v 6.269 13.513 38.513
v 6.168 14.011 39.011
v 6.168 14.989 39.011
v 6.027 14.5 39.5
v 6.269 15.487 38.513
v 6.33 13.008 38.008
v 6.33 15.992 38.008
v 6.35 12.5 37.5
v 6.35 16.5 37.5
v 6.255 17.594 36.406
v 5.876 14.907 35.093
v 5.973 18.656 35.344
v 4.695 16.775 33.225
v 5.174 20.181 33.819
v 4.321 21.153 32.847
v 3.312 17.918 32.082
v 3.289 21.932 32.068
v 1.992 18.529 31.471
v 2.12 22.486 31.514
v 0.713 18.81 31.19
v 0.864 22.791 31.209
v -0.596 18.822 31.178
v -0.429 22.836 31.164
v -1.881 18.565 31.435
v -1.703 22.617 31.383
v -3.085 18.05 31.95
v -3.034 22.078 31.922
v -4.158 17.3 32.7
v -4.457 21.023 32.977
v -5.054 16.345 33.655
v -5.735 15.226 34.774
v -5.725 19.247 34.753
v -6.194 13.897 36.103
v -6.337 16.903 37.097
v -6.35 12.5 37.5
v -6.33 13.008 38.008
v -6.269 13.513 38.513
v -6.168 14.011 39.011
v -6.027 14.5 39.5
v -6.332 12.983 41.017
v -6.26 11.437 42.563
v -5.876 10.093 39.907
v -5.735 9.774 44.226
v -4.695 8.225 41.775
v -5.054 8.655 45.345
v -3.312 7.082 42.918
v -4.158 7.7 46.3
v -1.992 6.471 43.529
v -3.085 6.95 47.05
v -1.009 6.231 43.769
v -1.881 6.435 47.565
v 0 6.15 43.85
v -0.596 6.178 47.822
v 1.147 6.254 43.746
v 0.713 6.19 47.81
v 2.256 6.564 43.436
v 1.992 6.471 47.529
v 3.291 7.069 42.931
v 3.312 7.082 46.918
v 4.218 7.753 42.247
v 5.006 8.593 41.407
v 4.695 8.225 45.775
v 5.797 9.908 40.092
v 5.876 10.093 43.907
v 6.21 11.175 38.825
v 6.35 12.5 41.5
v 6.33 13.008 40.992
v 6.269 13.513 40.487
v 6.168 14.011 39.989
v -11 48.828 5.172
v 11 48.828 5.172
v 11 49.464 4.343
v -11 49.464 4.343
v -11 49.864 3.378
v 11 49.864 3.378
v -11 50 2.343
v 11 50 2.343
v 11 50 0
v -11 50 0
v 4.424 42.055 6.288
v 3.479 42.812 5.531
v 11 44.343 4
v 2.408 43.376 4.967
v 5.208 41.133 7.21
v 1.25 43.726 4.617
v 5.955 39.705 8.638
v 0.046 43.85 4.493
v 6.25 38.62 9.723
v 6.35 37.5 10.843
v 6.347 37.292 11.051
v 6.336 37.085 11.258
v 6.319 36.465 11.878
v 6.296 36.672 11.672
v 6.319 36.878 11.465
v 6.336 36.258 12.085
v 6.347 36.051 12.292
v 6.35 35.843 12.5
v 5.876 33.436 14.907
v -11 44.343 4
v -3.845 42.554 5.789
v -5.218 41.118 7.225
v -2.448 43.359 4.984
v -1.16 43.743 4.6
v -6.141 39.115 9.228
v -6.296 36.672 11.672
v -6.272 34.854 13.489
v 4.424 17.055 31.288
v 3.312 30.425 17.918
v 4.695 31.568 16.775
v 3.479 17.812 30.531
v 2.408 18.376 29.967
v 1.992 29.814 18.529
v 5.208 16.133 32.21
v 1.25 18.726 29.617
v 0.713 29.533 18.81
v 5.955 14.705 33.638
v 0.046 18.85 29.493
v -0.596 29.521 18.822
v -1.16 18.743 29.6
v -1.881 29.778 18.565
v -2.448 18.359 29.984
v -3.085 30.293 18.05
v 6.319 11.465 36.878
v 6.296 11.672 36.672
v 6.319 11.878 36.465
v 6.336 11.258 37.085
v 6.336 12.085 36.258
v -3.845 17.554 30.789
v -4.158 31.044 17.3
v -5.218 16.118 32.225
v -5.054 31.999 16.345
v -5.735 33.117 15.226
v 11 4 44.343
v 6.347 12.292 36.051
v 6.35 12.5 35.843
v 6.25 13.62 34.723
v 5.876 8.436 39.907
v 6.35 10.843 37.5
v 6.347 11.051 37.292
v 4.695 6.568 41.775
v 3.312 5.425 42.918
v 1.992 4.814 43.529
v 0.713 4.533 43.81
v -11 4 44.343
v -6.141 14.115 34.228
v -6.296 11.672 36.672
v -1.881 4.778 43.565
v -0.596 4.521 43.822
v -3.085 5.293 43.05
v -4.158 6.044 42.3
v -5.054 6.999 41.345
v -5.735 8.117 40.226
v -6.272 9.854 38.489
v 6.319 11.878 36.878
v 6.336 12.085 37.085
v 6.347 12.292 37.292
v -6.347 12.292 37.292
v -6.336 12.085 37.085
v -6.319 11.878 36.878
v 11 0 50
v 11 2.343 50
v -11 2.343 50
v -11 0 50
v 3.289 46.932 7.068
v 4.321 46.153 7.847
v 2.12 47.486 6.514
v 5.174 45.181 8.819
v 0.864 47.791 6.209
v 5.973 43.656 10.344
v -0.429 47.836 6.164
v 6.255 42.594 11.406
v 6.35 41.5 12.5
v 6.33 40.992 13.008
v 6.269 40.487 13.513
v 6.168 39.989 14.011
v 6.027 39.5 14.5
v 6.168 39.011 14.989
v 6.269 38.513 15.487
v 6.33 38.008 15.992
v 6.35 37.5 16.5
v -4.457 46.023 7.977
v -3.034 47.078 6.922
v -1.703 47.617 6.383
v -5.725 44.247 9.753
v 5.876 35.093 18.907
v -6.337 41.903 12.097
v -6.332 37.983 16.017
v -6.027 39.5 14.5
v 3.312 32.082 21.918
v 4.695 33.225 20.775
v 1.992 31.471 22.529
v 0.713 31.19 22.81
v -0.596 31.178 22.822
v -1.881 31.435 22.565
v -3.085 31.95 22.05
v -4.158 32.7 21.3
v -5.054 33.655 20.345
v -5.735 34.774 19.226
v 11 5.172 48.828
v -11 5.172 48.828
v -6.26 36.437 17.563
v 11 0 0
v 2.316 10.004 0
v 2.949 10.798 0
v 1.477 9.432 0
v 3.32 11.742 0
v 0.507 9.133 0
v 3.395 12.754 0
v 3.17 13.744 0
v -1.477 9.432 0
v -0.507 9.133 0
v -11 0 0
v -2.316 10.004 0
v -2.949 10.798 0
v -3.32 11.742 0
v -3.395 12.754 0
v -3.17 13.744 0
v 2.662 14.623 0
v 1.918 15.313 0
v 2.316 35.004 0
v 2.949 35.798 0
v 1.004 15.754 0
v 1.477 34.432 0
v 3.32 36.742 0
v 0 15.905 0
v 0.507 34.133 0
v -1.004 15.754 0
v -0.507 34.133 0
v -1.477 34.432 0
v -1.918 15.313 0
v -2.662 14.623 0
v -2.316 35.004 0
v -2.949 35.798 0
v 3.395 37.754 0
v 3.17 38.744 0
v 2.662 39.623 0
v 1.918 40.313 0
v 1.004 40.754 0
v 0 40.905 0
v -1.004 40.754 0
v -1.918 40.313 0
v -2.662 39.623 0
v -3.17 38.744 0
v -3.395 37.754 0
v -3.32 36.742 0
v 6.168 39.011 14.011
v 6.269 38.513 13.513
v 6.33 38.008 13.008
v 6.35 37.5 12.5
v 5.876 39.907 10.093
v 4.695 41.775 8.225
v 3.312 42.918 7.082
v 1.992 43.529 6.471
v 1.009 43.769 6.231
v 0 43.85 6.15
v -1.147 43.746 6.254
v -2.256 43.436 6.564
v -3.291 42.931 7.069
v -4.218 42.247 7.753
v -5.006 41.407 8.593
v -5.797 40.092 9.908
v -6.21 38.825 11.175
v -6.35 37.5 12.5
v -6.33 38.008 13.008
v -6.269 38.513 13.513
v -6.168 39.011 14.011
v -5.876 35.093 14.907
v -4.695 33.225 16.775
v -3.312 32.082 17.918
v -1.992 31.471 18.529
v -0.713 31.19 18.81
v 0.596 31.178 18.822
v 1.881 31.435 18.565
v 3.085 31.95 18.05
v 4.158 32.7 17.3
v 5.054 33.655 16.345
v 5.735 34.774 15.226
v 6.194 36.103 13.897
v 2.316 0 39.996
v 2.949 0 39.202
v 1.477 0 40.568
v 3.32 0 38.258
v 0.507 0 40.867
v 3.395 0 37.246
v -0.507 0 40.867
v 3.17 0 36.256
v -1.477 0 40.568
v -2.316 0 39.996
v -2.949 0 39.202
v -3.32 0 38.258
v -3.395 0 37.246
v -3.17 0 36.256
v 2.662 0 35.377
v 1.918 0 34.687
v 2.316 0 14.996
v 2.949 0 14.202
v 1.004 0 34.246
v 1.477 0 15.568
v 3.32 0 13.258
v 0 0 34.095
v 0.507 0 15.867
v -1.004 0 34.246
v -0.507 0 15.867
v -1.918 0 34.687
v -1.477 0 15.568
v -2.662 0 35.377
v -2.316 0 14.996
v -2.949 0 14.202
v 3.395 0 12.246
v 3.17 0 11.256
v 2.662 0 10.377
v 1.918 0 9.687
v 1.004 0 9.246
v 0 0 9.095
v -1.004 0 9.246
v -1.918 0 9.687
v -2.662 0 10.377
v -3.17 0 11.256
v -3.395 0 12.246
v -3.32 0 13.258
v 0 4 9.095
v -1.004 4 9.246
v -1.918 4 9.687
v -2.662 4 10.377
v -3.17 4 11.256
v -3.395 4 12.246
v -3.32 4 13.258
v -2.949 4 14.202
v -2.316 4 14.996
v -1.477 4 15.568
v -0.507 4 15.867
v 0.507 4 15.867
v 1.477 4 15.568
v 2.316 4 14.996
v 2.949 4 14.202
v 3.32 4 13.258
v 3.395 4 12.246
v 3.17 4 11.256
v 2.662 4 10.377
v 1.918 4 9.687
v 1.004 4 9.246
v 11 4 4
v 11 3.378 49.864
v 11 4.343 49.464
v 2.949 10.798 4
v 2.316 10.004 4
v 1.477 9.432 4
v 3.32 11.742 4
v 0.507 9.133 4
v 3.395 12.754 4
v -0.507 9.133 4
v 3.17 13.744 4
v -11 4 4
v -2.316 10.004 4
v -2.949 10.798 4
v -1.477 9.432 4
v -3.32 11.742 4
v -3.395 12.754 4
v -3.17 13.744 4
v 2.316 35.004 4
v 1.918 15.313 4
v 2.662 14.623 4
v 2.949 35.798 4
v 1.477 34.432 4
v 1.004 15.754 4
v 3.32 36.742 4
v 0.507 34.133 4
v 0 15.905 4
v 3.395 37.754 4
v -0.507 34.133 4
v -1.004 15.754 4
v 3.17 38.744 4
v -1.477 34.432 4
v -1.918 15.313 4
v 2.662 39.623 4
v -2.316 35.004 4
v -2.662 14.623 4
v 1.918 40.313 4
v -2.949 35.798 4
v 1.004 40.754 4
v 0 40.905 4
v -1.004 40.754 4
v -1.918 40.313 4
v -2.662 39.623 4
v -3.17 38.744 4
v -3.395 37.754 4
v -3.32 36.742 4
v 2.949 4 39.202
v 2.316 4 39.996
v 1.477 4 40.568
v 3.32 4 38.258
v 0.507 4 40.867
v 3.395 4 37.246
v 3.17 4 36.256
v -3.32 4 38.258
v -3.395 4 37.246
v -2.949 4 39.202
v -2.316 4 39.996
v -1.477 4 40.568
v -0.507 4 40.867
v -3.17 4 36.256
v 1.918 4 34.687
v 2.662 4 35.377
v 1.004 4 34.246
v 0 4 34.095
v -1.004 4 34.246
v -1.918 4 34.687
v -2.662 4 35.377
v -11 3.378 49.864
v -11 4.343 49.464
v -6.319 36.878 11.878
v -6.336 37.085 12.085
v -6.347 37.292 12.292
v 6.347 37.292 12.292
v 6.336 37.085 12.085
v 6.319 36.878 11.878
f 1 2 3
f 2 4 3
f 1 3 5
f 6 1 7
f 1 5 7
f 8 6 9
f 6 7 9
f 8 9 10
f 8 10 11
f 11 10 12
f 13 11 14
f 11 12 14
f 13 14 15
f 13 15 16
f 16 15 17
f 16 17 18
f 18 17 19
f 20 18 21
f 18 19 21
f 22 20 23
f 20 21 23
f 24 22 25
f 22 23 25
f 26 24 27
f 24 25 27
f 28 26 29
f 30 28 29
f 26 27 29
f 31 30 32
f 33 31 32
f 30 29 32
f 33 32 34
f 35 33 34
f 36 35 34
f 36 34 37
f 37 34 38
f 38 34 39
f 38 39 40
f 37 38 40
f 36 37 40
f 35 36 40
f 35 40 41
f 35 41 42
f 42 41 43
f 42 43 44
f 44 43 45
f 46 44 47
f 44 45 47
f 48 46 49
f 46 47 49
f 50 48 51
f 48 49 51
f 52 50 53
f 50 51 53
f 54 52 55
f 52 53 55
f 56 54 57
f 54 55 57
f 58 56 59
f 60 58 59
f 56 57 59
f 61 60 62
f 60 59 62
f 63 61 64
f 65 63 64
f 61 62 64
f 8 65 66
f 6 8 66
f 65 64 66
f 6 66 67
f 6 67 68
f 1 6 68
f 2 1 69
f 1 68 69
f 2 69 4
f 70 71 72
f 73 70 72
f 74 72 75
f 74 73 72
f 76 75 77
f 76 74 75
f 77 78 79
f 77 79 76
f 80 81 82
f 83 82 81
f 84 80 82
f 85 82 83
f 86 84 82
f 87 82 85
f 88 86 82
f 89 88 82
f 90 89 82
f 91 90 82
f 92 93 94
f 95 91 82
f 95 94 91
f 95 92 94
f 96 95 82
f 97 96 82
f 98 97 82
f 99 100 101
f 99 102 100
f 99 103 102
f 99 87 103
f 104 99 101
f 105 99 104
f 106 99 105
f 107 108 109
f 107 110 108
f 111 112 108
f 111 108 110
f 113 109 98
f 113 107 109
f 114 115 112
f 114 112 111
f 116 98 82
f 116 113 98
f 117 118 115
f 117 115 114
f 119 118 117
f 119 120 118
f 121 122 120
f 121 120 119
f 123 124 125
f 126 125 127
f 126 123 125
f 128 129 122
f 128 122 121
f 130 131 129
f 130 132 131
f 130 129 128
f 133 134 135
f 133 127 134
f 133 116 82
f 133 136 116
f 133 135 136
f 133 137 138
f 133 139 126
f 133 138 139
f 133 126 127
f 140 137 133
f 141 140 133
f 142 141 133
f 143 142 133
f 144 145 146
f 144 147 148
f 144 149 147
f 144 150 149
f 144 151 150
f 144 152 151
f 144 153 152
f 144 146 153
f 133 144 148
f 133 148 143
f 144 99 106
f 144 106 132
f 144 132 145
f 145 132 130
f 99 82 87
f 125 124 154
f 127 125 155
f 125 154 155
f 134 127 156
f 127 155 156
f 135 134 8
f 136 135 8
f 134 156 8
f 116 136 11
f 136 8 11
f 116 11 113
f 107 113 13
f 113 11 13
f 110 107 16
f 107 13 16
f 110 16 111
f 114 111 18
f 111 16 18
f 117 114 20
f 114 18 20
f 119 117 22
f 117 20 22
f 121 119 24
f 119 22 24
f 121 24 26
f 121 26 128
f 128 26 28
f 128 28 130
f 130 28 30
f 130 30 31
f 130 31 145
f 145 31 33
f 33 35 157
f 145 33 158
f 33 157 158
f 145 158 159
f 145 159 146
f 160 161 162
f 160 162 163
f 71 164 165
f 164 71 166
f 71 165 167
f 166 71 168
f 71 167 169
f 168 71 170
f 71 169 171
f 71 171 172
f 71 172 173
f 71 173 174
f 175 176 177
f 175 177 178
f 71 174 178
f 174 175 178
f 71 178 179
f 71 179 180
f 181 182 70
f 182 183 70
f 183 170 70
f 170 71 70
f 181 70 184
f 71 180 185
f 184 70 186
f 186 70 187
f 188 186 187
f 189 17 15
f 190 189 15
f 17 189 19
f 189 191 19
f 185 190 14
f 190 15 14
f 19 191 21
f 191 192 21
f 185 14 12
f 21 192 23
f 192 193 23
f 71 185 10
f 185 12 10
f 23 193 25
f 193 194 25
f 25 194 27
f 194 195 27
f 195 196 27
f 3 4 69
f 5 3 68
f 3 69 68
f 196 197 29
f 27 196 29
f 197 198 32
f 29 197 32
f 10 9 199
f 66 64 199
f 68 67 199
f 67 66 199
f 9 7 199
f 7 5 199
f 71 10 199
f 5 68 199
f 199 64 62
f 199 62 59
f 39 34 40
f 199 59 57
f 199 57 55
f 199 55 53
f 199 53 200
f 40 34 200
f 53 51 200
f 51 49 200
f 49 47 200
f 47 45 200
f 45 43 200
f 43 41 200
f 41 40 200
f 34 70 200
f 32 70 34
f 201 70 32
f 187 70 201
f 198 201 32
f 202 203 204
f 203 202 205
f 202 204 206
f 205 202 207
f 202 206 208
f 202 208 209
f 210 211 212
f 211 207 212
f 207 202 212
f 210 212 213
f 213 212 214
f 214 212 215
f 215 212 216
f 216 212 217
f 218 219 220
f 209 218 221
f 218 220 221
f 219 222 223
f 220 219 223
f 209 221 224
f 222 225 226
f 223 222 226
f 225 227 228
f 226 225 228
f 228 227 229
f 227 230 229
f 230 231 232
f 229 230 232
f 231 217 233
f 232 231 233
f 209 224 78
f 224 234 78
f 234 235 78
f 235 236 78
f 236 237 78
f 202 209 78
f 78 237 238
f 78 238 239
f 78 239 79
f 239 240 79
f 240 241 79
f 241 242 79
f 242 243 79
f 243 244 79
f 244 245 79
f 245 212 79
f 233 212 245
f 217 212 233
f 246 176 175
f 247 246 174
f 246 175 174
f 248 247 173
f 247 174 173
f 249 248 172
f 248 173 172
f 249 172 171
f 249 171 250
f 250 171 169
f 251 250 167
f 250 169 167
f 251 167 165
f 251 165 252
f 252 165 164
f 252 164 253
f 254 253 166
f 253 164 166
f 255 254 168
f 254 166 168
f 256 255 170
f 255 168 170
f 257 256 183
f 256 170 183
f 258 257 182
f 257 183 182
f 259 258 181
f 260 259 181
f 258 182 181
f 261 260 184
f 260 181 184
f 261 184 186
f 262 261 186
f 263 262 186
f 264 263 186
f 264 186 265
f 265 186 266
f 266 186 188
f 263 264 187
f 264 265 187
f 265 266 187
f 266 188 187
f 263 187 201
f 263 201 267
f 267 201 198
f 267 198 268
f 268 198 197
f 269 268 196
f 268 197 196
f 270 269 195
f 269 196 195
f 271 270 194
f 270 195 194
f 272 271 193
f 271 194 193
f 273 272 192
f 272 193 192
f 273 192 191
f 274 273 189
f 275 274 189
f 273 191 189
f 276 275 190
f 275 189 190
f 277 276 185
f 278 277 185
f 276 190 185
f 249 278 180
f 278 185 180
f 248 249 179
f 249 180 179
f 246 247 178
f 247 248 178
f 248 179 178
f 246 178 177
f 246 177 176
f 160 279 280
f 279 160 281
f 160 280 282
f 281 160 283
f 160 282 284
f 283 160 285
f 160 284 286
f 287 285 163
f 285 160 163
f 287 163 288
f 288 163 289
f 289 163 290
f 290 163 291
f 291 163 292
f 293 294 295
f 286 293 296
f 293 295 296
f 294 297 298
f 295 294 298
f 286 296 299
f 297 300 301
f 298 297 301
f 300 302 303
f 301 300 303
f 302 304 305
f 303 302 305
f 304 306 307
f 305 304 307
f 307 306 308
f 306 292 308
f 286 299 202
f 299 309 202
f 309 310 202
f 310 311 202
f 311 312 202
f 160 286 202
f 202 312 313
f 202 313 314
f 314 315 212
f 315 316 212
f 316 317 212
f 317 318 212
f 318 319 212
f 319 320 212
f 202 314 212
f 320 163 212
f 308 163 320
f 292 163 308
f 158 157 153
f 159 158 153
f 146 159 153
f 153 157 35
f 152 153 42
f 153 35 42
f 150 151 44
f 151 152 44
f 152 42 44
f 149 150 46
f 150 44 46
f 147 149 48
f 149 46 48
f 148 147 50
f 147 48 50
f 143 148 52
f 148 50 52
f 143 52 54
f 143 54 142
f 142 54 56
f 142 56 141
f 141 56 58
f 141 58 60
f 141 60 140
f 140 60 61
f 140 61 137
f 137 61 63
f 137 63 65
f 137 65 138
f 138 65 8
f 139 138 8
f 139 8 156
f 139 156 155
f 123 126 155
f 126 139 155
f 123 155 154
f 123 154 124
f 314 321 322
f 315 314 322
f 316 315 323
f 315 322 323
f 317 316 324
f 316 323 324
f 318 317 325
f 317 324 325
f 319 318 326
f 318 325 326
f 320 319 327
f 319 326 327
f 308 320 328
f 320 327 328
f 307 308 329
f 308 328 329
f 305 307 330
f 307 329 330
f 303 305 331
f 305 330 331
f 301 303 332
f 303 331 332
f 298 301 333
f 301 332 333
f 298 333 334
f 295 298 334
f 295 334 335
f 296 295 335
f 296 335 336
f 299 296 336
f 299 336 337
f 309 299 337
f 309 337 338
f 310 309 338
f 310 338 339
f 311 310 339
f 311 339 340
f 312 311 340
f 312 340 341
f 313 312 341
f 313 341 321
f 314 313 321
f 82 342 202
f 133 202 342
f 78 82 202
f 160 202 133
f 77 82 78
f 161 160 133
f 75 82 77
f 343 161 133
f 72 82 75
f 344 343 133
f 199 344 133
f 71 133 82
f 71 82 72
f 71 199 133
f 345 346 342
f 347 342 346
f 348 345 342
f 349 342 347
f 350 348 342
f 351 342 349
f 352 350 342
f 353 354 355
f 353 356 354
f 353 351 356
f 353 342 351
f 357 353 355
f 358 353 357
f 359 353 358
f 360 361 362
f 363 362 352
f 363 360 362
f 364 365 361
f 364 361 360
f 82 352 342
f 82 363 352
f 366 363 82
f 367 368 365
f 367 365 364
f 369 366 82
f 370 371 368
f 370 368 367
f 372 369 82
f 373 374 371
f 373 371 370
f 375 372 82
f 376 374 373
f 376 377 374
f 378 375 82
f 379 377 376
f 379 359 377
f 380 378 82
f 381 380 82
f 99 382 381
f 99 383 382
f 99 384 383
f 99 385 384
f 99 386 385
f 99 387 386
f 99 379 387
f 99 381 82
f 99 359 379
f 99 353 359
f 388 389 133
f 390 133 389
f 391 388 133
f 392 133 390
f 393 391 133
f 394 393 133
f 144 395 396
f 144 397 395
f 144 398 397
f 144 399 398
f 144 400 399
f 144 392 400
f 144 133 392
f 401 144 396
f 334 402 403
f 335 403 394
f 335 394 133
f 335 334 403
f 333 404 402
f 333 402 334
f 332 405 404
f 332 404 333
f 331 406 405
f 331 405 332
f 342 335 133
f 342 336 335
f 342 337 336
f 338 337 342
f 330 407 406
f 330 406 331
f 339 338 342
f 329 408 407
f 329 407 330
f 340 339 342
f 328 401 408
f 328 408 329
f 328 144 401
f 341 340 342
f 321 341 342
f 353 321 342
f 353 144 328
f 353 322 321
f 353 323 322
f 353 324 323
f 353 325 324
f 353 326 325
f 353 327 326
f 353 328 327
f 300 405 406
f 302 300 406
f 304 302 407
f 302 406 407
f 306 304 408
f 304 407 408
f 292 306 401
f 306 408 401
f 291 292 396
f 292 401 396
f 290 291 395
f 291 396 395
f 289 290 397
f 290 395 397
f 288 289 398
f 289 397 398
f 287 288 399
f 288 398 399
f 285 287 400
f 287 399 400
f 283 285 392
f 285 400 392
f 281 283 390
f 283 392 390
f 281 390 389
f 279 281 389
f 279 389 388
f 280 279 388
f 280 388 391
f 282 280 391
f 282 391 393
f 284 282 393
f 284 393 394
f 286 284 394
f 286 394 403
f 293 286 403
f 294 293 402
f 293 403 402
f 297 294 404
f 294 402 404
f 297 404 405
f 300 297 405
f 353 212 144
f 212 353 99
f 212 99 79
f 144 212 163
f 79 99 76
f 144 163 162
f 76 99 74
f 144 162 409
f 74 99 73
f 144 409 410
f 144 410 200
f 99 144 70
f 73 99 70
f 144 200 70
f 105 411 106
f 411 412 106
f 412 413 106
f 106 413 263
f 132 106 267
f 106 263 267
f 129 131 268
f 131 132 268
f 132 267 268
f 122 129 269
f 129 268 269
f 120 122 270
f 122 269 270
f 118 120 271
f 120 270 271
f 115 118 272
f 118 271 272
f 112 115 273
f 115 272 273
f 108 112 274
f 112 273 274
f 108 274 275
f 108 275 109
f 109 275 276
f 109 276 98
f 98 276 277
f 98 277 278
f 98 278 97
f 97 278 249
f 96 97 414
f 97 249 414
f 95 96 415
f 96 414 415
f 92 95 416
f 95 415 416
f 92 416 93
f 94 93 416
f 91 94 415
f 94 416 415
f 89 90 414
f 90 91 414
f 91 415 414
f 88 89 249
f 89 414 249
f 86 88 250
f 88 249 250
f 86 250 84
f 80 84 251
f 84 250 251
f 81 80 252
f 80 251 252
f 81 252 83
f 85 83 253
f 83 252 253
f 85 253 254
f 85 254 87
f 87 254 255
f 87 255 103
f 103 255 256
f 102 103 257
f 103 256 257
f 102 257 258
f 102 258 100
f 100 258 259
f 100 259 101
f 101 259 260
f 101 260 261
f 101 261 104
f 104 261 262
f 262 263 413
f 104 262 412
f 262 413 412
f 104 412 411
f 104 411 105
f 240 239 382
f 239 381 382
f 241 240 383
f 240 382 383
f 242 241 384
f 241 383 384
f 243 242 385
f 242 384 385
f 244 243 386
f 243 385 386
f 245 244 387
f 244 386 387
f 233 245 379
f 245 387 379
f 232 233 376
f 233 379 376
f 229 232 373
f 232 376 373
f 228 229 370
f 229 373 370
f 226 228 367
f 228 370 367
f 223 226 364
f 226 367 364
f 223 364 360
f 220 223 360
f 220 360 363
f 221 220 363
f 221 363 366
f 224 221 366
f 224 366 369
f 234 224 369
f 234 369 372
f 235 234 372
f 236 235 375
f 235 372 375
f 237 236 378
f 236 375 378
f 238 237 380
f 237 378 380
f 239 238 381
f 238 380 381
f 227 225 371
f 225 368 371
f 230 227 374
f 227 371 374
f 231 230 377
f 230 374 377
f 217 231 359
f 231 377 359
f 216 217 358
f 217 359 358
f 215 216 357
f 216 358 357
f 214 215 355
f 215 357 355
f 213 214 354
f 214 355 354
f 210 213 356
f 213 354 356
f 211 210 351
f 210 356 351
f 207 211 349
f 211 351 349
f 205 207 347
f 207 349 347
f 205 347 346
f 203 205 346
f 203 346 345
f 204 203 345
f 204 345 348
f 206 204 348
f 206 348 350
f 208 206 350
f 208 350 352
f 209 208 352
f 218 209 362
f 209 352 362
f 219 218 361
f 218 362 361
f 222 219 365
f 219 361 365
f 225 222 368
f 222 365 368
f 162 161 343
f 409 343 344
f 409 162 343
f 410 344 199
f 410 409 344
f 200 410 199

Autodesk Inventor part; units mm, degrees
ref_plane "YZ Plane" through (0, 0, 0) normal (1, 0, 0) x (0, 1, 0)
ref_plane "XZ Plane" through (0, 0, 0) normal (0, 1, 0) x (-1, 0, 0)
ref_plane "XY Plane" through (0, 0, 0) normal (0, 0, 1) x (1, 0, 0)
sketch "Sketch_1" plane through (0, 0, 0) normal (1, 0, 0) x (0, 1, 0)
  line L0 (2.3431, 50) -> (0, 50)
  line L1 (0, 50) -> (0, 0)
  line L2 (0, 0) -> (50, 0)
  line L3 (50, 0) -> (50, 2.3431)
  arc A0 (50, 2.3431) -> (48.8284, 5.1716) centre (46, 2.3431) ccw
  line L4 (48.8284, 5.1716) -> (5.1716, 48.8284)
  arc A1 (5.1716, 48.8284) -> (2.3431, 50) centre (2.3431, 46) ccw
  line L5 (4, 44.3431) -> (4, 4)
  line L6 (4, 4) -> (44.3431, 4)
  line L7 (44.3431, 4) -> (4, 44.3431)
extrude "Extrusion1" add sketch "Sketch_1" along normal mid plane 22
sketch "Sketch2" plane through (-11, 0, 0) normal (0, -1, 0) x (1, 0, 0)
  point P0 (11, 12.5)
hole "Hole1" at (0, 0, 12.5) direction (0, 1, 0) diameter 6.81 depth 4
sketch "Sketch3" plane through (11, 50, 0) normal (0, 0, -1) x (-1, 0, 0)
  point P0 (11, -37.5)
hole "Hole2" at (0, 12.5, 0) direction (0, 0, 1) diameter 6.81 depth 4
sketch "Sketch_4" plane through (0, 0, 50) normal (0, 0, 1) x (1, 0, 0)
  circle A0 centre (0, 12.5) radius 6.35
extrude "Extrusion2" cut sketch "Sketch_4" against normal blind 46
sketch "Sketch_5" plane through (0, 50, 0) normal (0, 1, 0) x (1, 0, 0)
  circle A0 centre (0, -12.5) radius 6.35
extrude "Extrusion3" cut sketch "Sketch_5" against normal blind 46
sketch "Sketch6" plane through (11, 50, 0) normal (0, 0, -1) x (-1, 0, 0)
  point P0 (11, -12.5)
hole "Hole3" at (0, 37.5, 0) direction (0, 0, 1) diameter 6.81 depth 4
sketch "Sketch7" plane through (-11, 0, 0) normal (0, -1, 0) x (1, 0, 0)
  point P0 (11, 37.5)
hole "Hole4" at (0, 0, 37.5) direction (0, 1, 0) diameter 6.81 depth 4
sketch "Sketch_8" plane through (0, 0, 50) normal (0, 0, 1) x (1, 0, 0)
  circle A0 centre (0, 37.5) radius 6.35
extrude "Extrusion4" cut sketch "Sketch_8" against normal blind 46
sketch "Sketch_9" plane through (0, 50, 0) normal (0, 1, 0) x (1, 0, 0)
  circle A0 centre (0, -37.5) radius 6.35
extrude "Extrusion5" cut sketch "Sketch_9" against normal blind 46
properties part number "25-4136 Aluminum"
